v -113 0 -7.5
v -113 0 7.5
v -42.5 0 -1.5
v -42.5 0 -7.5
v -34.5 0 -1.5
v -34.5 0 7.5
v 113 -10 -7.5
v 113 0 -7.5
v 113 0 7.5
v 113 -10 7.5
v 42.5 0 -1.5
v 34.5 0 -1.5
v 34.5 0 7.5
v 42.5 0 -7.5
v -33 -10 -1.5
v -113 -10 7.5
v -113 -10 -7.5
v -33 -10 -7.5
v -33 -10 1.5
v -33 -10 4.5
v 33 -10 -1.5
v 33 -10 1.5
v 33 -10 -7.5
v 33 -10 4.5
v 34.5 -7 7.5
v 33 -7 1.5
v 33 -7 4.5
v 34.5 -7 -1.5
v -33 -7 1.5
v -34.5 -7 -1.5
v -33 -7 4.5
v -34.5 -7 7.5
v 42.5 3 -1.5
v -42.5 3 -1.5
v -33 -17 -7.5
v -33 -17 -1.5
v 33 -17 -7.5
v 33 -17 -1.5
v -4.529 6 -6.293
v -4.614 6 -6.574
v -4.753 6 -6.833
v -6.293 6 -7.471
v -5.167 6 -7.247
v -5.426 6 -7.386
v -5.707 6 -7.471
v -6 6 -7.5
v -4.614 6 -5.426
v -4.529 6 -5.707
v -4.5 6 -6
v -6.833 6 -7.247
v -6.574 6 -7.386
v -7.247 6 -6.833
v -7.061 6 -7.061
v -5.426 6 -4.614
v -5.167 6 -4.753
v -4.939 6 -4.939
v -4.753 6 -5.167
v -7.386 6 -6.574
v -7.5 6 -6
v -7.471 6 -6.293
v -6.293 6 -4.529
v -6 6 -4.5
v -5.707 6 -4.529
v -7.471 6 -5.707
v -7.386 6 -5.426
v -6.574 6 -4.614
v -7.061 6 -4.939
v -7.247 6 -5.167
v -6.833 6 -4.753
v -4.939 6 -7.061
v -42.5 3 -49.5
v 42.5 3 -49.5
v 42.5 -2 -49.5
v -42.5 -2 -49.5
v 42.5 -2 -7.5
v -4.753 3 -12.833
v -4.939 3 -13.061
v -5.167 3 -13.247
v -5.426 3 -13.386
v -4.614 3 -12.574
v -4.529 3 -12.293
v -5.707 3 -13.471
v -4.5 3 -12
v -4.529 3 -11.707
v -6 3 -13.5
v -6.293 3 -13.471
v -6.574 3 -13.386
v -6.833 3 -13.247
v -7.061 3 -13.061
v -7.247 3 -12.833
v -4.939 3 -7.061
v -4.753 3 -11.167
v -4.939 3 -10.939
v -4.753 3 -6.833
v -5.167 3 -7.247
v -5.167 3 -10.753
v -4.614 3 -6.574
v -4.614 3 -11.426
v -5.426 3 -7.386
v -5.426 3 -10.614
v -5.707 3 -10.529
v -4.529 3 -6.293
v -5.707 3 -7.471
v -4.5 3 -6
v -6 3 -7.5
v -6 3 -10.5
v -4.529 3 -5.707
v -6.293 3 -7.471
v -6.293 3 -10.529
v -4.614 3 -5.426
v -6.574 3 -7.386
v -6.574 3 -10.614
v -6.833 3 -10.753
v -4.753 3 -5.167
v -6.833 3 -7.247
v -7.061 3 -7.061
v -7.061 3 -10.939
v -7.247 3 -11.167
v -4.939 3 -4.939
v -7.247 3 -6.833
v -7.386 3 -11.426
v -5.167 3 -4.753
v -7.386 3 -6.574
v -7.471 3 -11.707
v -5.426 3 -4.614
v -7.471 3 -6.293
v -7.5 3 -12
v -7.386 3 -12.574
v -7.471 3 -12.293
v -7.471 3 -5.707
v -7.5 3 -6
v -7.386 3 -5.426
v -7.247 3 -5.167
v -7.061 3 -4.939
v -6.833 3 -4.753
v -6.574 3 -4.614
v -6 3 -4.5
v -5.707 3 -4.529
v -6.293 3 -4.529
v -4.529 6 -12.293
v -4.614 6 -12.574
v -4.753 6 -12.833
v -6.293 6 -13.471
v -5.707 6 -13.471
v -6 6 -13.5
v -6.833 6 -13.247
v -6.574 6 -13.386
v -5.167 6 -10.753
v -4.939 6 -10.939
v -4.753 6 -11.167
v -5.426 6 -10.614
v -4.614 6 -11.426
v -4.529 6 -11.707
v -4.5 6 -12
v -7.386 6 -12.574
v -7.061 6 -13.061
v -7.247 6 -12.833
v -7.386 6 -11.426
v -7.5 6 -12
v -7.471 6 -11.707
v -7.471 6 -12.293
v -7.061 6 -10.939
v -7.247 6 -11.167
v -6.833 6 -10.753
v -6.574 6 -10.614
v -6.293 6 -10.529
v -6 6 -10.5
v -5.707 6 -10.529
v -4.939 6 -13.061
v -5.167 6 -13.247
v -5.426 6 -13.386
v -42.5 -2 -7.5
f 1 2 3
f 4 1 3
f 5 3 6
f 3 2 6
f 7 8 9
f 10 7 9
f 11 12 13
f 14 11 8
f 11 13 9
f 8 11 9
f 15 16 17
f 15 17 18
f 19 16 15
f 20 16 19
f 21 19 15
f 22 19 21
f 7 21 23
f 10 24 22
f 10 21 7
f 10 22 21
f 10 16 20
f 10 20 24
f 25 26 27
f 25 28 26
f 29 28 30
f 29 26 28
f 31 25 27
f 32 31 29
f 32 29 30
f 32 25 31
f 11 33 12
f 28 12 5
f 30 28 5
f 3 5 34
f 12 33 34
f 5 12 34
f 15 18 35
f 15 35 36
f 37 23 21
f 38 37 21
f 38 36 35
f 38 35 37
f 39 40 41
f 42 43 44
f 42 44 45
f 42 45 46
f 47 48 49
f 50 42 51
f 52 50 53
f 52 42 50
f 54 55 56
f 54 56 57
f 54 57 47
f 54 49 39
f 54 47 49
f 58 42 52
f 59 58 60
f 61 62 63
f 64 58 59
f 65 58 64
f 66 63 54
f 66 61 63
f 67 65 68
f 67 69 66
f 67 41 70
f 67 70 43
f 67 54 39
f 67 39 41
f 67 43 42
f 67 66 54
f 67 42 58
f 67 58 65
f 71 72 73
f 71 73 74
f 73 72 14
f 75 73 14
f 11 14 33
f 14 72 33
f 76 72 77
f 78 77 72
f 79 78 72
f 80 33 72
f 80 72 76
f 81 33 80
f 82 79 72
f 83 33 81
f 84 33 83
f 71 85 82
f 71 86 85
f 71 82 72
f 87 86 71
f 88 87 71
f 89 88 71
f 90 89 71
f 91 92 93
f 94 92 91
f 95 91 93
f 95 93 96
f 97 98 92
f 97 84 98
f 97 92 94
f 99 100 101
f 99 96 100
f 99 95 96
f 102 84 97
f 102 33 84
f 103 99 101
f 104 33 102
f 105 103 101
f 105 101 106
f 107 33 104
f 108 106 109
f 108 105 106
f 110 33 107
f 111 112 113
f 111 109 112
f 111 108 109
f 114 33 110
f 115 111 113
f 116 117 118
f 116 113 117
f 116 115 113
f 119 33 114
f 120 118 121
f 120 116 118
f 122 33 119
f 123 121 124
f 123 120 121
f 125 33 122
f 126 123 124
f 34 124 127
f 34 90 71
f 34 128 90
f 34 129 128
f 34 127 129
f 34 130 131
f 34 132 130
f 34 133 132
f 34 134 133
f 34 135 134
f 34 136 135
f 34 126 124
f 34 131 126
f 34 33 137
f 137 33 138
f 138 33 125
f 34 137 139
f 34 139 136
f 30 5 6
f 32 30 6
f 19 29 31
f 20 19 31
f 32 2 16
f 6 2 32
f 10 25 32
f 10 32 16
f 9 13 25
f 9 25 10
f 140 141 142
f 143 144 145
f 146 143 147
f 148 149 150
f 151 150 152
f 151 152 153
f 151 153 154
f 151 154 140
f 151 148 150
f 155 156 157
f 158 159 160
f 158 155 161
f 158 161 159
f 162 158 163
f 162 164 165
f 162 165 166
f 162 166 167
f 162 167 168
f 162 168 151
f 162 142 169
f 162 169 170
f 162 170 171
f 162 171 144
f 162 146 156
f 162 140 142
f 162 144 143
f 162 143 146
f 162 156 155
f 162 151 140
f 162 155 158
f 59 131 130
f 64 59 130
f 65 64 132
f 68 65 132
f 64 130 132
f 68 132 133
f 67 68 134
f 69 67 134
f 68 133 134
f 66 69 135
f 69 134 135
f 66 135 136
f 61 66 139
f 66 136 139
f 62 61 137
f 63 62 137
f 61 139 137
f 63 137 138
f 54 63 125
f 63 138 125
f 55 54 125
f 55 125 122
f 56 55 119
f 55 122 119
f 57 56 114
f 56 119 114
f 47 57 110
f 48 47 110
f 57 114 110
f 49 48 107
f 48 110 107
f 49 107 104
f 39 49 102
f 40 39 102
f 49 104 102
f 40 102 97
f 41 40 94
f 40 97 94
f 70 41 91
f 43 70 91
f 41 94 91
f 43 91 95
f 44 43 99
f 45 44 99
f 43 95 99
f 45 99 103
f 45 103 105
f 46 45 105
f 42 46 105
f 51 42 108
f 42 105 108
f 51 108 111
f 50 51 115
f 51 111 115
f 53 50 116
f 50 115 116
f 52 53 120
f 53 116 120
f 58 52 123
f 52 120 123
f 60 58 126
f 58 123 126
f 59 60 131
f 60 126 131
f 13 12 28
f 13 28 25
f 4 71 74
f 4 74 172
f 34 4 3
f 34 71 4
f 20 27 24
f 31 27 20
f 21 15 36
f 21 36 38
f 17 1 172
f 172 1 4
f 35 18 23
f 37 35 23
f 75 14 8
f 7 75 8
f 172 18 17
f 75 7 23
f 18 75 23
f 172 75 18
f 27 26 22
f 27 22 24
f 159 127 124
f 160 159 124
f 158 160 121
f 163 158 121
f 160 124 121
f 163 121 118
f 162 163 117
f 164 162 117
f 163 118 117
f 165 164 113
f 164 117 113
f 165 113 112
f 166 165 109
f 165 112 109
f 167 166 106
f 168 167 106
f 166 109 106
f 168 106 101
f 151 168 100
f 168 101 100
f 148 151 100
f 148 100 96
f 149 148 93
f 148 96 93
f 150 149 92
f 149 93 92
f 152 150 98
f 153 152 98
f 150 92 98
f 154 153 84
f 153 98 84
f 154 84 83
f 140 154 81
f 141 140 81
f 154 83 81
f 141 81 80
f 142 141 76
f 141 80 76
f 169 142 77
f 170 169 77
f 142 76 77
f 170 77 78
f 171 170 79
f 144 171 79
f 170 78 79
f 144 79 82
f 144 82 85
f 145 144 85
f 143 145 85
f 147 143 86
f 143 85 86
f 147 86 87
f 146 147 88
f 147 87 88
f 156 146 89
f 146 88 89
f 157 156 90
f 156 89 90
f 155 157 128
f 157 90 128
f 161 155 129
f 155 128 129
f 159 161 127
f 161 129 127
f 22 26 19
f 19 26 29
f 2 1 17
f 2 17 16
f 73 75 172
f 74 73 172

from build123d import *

# Parameters (mm, degrees)
F0_W          = 226
F0_H          = 15
F1_DEPTH      = 10
F2_W          = 66
F2_H          = 6
F3_DEPTH      = 7
F4_W          = 85
F4_H          = 49.5
F5_DEPTH      = 3
F5_DEPTH_BACK = 2
F6_W          = 69
F6_H          = 18
F7_DEPTH      = 7
F8_W          = 66
F8_H          = 3
F9_DEPTH      = 25
F10_W         = 85
F10_H         = 1
F11_DEPTH     = 3
F12_W         = 85
F12_H         = 0.5
F13_DEPTH     = 3
F14_R         = 1.5
F15_DEPTH     = 3


with BuildPart() as f1:
    # F0 (on Front) → F1 (new body)
    with BuildSketch(Plane.XZ):
        Rectangle(F0_W, F0_H)
    extrude(amount=F1_DEPTH)

    # F2 (on face) → F3 (join)
    with BuildSketch(Plane.XZ.offset(10)):
        with Locations((0, -4.5)):
            Rectangle(F2_W, F2_H)
    extrude(amount=F3_DEPTH)

    # F4 (on face) → F5 (join, two sides)
    with BuildSketch(Plane(origin=(0, 0, 0), x_dir=(-1, 0, 0), z_dir=(0, 1, 0))) as f5_sk:
        with Locations((0, -24.75)):
            Rectangle(F4_W, F4_H)
    extrude(amount=F5_DEPTH)
    extrude(f5_sk.sketch, amount=-F5_DEPTH_BACK)

    # F6 (on face) → F7 (cut)
    with BuildSketch(Plane(origin=(0, 0, 0), x_dir=(-1, 0, 0), z_dir=(0, 1, 0))):
        with Locations((0, 7.5)):
            Rectangle(F6_W, F6_H)
    extrude(amount=-F7_DEPTH, mode=Mode.SUBTRACT)

    # F8 (on face) → F9 (cut)
    with BuildSketch(Plane(origin=(0, -7, 0), x_dir=(-1, 0, 0), z_dir=(0, 1, 0))):
        with Locations((0, 3)):
            Rectangle(F8_W, F8_H)
    extrude(amount=-F9_DEPTH, mode=Mode.SUBTRACT)

    # F10 (on face) → F11 (cut)
    with BuildSketch(Plane(origin=(0, 3, 0), x_dir=(-1, 0, 0), z_dir=(0, 1, 0))):
        with Locations((0, -0.5)):
            Rectangle(F10_W, F10_H)
    extrude(amount=-F11_DEPTH, mode=Mode.SUBTRACT)

    # F12 (on face) → F13 (cut)
    with BuildSketch(Plane(origin=(0, 3, 0), x_dir=(-1, 0, 0), z_dir=(0, 1, 0))):
        with Locations((0, -1.25)):
            Rectangle(F12_W, F12_H)
    extrude(amount=-F13_DEPTH, mode=Mode.SUBTRACT)

    # F14 (on face) → F15 (join)
    with BuildSketch(Plane(origin=(0, 3, 0), x_dir=(-1, 0, 0), z_dir=(0, 1, 0))):
        with Locations((6, -6)):
            Circle(F14_R)
        with Locations((6, -12)):
            Circle(F14_R)
    extrude(amount=F15_DEPTH)


solid = f1.part
